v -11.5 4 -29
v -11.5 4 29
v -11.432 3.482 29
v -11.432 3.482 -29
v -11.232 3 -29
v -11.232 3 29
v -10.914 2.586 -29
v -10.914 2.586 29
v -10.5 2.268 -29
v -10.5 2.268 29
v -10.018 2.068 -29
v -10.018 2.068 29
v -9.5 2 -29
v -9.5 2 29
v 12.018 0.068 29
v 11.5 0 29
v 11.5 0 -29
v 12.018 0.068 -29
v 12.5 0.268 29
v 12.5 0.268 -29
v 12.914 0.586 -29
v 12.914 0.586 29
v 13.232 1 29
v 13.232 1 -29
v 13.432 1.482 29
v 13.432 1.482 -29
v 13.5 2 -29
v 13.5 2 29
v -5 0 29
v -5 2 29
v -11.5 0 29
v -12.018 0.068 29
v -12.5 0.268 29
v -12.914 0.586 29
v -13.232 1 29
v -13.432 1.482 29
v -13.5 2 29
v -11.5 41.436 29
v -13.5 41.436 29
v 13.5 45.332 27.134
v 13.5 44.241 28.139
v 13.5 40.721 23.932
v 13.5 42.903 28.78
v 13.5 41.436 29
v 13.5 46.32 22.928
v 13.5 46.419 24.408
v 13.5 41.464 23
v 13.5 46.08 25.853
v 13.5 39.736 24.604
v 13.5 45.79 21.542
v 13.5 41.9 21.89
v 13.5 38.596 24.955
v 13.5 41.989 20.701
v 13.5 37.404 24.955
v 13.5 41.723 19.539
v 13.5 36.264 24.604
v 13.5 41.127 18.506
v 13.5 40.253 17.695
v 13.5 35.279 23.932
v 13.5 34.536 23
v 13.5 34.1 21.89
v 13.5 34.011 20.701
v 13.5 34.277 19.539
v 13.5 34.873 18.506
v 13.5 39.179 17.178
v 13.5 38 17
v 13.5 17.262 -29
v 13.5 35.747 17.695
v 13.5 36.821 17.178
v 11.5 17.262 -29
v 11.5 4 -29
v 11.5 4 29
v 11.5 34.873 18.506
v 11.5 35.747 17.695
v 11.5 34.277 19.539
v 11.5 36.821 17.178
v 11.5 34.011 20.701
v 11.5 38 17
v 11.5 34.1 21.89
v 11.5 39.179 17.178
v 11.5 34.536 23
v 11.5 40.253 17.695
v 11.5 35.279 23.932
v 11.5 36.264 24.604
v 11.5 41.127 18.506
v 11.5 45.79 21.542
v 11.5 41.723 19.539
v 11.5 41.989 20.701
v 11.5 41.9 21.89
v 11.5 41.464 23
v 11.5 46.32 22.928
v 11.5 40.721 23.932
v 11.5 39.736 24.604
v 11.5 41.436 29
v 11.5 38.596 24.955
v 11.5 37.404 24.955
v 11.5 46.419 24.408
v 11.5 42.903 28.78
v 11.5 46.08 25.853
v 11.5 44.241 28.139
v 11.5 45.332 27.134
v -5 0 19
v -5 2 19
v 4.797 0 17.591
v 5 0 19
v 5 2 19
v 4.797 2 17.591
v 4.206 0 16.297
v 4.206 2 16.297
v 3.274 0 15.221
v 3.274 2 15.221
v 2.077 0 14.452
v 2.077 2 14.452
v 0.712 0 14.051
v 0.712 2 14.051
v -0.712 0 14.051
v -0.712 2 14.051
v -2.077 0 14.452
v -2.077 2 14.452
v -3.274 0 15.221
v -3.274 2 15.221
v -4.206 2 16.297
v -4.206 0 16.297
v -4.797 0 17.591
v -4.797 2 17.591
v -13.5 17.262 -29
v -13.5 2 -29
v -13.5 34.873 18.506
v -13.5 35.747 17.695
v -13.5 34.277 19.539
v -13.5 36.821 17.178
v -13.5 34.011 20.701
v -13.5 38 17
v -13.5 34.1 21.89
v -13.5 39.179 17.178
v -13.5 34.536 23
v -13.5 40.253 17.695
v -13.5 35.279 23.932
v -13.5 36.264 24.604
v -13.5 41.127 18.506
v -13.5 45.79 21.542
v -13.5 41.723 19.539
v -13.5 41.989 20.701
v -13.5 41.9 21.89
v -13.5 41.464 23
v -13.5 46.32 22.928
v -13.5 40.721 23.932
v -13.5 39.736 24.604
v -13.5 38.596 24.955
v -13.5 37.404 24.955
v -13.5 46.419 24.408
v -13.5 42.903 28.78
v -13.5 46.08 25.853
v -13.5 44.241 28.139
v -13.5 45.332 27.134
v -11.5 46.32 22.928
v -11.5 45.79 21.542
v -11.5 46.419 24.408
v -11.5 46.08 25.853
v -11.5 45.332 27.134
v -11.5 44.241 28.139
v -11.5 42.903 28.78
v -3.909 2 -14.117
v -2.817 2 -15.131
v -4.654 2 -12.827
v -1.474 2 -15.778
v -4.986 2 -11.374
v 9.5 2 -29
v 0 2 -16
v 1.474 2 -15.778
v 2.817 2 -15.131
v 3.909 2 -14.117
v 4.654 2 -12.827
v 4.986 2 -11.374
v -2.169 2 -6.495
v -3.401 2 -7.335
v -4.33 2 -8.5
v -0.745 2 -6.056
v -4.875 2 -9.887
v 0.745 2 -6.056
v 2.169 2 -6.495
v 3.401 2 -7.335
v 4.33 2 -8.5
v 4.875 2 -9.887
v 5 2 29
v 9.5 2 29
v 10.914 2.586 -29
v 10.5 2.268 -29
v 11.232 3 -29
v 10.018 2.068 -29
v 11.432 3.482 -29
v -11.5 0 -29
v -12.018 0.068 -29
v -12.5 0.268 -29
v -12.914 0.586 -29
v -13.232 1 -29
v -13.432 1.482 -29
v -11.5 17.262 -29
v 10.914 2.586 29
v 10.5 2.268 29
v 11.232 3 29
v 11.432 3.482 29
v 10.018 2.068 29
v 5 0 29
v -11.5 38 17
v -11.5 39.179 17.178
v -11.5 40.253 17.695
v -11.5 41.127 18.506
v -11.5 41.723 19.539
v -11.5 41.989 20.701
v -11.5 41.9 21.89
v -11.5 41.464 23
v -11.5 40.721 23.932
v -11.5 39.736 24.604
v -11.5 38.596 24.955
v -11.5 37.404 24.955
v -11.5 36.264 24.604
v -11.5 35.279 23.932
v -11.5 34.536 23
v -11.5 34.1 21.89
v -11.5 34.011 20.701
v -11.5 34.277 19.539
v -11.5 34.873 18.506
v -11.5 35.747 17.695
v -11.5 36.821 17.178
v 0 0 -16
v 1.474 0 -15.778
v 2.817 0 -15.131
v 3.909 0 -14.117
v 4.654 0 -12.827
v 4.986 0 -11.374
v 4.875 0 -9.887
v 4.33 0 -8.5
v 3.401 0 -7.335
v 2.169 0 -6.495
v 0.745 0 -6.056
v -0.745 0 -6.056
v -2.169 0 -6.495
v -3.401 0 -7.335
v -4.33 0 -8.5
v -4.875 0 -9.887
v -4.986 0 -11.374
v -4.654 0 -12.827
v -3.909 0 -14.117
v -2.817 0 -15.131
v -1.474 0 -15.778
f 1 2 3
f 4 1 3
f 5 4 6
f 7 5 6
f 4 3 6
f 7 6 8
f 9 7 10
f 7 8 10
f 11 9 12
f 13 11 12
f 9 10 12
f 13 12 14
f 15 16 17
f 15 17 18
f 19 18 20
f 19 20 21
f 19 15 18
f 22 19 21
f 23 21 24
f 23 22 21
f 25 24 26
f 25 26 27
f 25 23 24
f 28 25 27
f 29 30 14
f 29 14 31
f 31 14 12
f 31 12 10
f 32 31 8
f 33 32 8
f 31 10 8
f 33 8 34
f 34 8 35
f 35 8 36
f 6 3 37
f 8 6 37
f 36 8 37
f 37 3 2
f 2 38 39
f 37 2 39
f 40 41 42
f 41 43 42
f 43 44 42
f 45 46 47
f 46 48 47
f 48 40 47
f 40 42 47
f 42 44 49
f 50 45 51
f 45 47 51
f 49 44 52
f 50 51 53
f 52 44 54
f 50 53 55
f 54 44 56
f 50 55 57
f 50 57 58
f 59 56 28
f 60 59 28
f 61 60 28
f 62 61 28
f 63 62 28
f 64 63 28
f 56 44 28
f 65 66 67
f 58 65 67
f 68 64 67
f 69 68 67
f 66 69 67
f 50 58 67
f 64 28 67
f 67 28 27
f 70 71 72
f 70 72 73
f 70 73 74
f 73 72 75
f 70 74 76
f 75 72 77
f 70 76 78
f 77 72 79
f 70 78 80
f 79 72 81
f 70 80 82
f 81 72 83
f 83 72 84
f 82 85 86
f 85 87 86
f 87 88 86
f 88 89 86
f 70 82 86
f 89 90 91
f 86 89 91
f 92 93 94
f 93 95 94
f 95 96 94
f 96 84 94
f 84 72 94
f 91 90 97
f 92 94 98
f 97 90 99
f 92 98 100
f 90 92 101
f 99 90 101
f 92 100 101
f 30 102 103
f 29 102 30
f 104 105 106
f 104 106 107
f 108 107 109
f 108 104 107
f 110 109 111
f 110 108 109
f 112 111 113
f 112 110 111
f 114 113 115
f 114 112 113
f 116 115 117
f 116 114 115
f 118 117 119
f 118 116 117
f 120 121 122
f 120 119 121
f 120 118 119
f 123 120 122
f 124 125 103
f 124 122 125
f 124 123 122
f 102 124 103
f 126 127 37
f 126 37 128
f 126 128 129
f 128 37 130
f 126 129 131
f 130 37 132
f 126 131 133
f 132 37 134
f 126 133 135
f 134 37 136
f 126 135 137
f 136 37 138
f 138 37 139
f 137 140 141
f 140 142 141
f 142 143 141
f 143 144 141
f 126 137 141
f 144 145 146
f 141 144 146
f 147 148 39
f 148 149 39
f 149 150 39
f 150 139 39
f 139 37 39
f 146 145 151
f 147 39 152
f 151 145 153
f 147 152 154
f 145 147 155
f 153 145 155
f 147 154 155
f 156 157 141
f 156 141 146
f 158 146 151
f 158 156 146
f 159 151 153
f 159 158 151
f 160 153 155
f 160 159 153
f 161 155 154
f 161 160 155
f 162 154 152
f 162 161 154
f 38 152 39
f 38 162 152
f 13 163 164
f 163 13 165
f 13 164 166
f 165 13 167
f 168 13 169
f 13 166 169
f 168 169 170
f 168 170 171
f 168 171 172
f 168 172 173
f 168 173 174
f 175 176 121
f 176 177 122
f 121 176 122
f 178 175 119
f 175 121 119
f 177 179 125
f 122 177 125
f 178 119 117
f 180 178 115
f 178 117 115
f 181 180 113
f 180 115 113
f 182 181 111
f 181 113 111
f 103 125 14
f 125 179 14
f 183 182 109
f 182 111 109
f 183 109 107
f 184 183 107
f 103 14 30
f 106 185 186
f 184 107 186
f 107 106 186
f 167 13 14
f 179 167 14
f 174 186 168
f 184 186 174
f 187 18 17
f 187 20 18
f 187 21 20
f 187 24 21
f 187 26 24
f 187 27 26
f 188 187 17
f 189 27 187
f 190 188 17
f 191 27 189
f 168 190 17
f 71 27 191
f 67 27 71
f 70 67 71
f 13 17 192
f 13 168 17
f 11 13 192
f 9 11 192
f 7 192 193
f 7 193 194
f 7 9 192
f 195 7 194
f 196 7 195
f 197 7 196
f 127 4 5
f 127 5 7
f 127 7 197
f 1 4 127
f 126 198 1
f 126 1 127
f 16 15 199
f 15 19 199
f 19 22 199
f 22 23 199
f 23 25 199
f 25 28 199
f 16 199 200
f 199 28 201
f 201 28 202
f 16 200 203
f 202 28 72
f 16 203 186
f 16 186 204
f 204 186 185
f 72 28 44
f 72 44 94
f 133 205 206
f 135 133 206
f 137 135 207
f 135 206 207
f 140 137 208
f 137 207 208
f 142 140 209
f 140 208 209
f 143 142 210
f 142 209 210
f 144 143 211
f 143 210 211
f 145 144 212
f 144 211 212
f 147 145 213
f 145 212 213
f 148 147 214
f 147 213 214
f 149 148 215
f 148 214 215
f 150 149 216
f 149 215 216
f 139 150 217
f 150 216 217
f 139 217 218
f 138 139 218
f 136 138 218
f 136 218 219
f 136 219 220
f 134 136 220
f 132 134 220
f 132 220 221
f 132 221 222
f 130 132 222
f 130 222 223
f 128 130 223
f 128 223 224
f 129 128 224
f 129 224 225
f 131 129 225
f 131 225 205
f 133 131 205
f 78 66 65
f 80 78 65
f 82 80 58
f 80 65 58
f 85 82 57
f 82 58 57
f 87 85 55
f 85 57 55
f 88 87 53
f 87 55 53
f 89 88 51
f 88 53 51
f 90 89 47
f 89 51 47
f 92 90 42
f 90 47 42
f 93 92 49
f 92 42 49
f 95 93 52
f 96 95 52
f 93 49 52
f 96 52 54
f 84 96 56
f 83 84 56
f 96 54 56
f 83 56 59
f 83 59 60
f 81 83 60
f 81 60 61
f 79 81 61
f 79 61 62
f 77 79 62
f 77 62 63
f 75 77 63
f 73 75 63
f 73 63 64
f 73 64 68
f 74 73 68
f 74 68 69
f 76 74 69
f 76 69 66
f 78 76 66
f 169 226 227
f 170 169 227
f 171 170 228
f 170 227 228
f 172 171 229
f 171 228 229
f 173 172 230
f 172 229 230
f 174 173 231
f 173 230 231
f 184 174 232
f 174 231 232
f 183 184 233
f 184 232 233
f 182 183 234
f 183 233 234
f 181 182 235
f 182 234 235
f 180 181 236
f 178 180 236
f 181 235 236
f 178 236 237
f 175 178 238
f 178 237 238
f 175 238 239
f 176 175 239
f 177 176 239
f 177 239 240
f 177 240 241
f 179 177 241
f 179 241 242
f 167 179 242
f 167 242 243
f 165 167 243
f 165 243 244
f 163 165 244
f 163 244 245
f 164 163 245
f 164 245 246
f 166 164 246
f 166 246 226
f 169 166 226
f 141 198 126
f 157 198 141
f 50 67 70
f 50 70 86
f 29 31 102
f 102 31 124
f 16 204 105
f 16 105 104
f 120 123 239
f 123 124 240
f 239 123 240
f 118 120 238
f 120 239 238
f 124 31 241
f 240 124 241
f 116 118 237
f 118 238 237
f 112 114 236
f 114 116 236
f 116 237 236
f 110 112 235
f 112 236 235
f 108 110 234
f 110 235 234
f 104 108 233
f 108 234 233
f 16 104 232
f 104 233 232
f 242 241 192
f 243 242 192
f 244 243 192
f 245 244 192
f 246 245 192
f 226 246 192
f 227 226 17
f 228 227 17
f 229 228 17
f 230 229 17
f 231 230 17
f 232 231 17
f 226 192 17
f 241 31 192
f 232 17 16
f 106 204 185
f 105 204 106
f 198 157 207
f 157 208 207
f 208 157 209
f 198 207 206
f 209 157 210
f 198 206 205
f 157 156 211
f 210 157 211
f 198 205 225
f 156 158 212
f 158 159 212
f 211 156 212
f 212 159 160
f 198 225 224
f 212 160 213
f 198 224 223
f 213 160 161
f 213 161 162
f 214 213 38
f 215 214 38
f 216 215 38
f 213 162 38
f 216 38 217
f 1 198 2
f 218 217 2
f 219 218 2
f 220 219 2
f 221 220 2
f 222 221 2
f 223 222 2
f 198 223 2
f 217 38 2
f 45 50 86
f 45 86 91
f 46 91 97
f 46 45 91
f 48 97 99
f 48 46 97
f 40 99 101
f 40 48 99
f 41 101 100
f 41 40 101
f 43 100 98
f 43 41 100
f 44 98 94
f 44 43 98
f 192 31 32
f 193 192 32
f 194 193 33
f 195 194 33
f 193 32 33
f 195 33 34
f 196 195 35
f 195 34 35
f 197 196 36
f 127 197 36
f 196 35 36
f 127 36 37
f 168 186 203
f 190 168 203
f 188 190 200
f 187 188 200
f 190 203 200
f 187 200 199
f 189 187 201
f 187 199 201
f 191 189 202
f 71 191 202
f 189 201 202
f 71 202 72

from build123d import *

# Parameters (mm, degrees)
SKETCH1_W           = 27
SKETCH1_H           = 58
BOSS_EXTRUDE1_DEPTH = 2
BOSS_EXTRUDE2_DEPTH = 58
CUT_EXTRUDE1_DEPTH  = 58
SKETCH4_R           = 4
CUT_EXTRUDE2_DEPTH  = 58
CUT_EXTRUDE3_DEPTH  = 58
CUT_EXTRUDE4_DEPTH  = 58
SKETCH7_R           = 5
CUT_EXTRUDE5_DEPTH  = 58


with BuildPart() as part:
    # Sketch1 → Boss-Extrude1 (new body)
    with BuildSketch(Plane(origin=(0, 0, 0), x_dir=(1, 0, 0), z_dir=(0, 1, 0))):
        Rectangle(SKETCH1_W, SKETCH1_H)
    extrude(amount=BOSS_EXTRUDE1_DEPTH)

    # Sketch2 → Boss-Extrude2 (add)
    with BuildSketch(Plane.XY.offset(29)):
        with BuildLine():
            Line((-13.5, 2), (-13.5, 50))
            Line((-13.5, 50), (-11.5, 50))
            Line((-11.5, 50), (-11.5, 4))
            ThreePointArc((-11.5, 4), (-10.914213562, 2.585786438), (-9.5, 2))
            Line((-9.5, 2), (9.5, 2))
            ThreePointArc((9.5, 2), (10.914213562, 2.585786438), (11.5, 4))
            Line((11.5, 4), (11.5, 50))
            Line((11.5, 50), (13.5, 50))
            Line((13.5, 50), (13.5, 2))
            ThreePointArc((13.5, 2), (12.914213562, 0.585786438), (11.5, 0))
            Line((11.5, 0), (-11.5, 0))
            ThreePointArc((-11.5, 0), (-12.914213562, 0.585786438), (-13.5, 2))
        make_face()
    extrude(amount=-BOSS_EXTRUDE2_DEPTH)

    # Sketch3 → Cut-Extrude1 (cut)
    with BuildSketch(Plane(origin=(13.5, 0, 0), x_dir=(0, 0, -1), z_dir=(1, 0, 0))):
        Polygon((29, 17.261652863), (-29, 50), (29, 50), align=None)
    extrude(amount=-CUT_EXTRUDE1_DEPTH, mode=Mode.SUBTRACT)

    # Sketch4 → Cut-Extrude2 (cut)
    with BuildSketch(Plane(origin=(13.5, 0, 0), x_dir=(0, 0, -1), z_dir=(1, 0, 0))):
        with Locations((-21, 38)):
            Circle(SKETCH4_R)
    extrude(amount=-CUT_EXTRUDE2_DEPTH, mode=Mode.SUBTRACT)

    # Sketch5 → Cut-Extrude3 (cut)
    with BuildSketch(Plane(origin=(13.5, 0, 0), x_dir=(0, 0, -1), z_dir=(1, 0, 0))):
        with BuildLine():
            Line((-29, 41.436194465), (-29, 50))
            Line((-29, 50), (-21.542232449, 45.790431328))
            ThreePointArc((-21.542232449, 45.790431328), (-26.521027791, 45.754112815), (-29, 41.436194465))
        make_face()
    extrude(amount=-CUT_EXTRUDE3_DEPTH, mode=Mode.SUBTRACT)

    # Sketch6 → Cut-Extrude4 (cut)
    with BuildSketch(Plane.XY.offset(29)):
        with BuildLine():
            Line((-13.5, 0), (-11.5, 0))
            ThreePointArc((-11.5, 0), (-12.914213562, 0.585786438), (-13.5, 2))
            Line((-13.5, 2), (-13.5, 0))
        make_face()
        with BuildLine():
            Line((13.5, 2), (13.5, 0))
            Line((13.5, 0), (11.5, 0))
            ThreePointArc((11.5, 0), (12.914213562, 0.585786438), (13.5, 2))
        make_face()
    extrude(amount=-CUT_EXTRUDE4_DEPTH, mode=Mode.SUBTRACT)

    # Sketch7 → Cut-Extrude5 (cut)
    with BuildSketch(Plane.XZ):
        with Locations(Location((0, -11, 0), (0, 0, 270))):
            Circle(SKETCH7_R)
        with BuildLine():
            Line((-5, 19), (-5, 29))
            Line((-5, 29), (5, 29))
            Line((5, 29), (5, 19))
            ThreePointArc((5, 19), (0, 14), (-5, 19))
        make_face()
    extrude(amount=-CUT_EXTRUDE5_DEPTH, mode=Mode.SUBTRACT)


solid = part.part
